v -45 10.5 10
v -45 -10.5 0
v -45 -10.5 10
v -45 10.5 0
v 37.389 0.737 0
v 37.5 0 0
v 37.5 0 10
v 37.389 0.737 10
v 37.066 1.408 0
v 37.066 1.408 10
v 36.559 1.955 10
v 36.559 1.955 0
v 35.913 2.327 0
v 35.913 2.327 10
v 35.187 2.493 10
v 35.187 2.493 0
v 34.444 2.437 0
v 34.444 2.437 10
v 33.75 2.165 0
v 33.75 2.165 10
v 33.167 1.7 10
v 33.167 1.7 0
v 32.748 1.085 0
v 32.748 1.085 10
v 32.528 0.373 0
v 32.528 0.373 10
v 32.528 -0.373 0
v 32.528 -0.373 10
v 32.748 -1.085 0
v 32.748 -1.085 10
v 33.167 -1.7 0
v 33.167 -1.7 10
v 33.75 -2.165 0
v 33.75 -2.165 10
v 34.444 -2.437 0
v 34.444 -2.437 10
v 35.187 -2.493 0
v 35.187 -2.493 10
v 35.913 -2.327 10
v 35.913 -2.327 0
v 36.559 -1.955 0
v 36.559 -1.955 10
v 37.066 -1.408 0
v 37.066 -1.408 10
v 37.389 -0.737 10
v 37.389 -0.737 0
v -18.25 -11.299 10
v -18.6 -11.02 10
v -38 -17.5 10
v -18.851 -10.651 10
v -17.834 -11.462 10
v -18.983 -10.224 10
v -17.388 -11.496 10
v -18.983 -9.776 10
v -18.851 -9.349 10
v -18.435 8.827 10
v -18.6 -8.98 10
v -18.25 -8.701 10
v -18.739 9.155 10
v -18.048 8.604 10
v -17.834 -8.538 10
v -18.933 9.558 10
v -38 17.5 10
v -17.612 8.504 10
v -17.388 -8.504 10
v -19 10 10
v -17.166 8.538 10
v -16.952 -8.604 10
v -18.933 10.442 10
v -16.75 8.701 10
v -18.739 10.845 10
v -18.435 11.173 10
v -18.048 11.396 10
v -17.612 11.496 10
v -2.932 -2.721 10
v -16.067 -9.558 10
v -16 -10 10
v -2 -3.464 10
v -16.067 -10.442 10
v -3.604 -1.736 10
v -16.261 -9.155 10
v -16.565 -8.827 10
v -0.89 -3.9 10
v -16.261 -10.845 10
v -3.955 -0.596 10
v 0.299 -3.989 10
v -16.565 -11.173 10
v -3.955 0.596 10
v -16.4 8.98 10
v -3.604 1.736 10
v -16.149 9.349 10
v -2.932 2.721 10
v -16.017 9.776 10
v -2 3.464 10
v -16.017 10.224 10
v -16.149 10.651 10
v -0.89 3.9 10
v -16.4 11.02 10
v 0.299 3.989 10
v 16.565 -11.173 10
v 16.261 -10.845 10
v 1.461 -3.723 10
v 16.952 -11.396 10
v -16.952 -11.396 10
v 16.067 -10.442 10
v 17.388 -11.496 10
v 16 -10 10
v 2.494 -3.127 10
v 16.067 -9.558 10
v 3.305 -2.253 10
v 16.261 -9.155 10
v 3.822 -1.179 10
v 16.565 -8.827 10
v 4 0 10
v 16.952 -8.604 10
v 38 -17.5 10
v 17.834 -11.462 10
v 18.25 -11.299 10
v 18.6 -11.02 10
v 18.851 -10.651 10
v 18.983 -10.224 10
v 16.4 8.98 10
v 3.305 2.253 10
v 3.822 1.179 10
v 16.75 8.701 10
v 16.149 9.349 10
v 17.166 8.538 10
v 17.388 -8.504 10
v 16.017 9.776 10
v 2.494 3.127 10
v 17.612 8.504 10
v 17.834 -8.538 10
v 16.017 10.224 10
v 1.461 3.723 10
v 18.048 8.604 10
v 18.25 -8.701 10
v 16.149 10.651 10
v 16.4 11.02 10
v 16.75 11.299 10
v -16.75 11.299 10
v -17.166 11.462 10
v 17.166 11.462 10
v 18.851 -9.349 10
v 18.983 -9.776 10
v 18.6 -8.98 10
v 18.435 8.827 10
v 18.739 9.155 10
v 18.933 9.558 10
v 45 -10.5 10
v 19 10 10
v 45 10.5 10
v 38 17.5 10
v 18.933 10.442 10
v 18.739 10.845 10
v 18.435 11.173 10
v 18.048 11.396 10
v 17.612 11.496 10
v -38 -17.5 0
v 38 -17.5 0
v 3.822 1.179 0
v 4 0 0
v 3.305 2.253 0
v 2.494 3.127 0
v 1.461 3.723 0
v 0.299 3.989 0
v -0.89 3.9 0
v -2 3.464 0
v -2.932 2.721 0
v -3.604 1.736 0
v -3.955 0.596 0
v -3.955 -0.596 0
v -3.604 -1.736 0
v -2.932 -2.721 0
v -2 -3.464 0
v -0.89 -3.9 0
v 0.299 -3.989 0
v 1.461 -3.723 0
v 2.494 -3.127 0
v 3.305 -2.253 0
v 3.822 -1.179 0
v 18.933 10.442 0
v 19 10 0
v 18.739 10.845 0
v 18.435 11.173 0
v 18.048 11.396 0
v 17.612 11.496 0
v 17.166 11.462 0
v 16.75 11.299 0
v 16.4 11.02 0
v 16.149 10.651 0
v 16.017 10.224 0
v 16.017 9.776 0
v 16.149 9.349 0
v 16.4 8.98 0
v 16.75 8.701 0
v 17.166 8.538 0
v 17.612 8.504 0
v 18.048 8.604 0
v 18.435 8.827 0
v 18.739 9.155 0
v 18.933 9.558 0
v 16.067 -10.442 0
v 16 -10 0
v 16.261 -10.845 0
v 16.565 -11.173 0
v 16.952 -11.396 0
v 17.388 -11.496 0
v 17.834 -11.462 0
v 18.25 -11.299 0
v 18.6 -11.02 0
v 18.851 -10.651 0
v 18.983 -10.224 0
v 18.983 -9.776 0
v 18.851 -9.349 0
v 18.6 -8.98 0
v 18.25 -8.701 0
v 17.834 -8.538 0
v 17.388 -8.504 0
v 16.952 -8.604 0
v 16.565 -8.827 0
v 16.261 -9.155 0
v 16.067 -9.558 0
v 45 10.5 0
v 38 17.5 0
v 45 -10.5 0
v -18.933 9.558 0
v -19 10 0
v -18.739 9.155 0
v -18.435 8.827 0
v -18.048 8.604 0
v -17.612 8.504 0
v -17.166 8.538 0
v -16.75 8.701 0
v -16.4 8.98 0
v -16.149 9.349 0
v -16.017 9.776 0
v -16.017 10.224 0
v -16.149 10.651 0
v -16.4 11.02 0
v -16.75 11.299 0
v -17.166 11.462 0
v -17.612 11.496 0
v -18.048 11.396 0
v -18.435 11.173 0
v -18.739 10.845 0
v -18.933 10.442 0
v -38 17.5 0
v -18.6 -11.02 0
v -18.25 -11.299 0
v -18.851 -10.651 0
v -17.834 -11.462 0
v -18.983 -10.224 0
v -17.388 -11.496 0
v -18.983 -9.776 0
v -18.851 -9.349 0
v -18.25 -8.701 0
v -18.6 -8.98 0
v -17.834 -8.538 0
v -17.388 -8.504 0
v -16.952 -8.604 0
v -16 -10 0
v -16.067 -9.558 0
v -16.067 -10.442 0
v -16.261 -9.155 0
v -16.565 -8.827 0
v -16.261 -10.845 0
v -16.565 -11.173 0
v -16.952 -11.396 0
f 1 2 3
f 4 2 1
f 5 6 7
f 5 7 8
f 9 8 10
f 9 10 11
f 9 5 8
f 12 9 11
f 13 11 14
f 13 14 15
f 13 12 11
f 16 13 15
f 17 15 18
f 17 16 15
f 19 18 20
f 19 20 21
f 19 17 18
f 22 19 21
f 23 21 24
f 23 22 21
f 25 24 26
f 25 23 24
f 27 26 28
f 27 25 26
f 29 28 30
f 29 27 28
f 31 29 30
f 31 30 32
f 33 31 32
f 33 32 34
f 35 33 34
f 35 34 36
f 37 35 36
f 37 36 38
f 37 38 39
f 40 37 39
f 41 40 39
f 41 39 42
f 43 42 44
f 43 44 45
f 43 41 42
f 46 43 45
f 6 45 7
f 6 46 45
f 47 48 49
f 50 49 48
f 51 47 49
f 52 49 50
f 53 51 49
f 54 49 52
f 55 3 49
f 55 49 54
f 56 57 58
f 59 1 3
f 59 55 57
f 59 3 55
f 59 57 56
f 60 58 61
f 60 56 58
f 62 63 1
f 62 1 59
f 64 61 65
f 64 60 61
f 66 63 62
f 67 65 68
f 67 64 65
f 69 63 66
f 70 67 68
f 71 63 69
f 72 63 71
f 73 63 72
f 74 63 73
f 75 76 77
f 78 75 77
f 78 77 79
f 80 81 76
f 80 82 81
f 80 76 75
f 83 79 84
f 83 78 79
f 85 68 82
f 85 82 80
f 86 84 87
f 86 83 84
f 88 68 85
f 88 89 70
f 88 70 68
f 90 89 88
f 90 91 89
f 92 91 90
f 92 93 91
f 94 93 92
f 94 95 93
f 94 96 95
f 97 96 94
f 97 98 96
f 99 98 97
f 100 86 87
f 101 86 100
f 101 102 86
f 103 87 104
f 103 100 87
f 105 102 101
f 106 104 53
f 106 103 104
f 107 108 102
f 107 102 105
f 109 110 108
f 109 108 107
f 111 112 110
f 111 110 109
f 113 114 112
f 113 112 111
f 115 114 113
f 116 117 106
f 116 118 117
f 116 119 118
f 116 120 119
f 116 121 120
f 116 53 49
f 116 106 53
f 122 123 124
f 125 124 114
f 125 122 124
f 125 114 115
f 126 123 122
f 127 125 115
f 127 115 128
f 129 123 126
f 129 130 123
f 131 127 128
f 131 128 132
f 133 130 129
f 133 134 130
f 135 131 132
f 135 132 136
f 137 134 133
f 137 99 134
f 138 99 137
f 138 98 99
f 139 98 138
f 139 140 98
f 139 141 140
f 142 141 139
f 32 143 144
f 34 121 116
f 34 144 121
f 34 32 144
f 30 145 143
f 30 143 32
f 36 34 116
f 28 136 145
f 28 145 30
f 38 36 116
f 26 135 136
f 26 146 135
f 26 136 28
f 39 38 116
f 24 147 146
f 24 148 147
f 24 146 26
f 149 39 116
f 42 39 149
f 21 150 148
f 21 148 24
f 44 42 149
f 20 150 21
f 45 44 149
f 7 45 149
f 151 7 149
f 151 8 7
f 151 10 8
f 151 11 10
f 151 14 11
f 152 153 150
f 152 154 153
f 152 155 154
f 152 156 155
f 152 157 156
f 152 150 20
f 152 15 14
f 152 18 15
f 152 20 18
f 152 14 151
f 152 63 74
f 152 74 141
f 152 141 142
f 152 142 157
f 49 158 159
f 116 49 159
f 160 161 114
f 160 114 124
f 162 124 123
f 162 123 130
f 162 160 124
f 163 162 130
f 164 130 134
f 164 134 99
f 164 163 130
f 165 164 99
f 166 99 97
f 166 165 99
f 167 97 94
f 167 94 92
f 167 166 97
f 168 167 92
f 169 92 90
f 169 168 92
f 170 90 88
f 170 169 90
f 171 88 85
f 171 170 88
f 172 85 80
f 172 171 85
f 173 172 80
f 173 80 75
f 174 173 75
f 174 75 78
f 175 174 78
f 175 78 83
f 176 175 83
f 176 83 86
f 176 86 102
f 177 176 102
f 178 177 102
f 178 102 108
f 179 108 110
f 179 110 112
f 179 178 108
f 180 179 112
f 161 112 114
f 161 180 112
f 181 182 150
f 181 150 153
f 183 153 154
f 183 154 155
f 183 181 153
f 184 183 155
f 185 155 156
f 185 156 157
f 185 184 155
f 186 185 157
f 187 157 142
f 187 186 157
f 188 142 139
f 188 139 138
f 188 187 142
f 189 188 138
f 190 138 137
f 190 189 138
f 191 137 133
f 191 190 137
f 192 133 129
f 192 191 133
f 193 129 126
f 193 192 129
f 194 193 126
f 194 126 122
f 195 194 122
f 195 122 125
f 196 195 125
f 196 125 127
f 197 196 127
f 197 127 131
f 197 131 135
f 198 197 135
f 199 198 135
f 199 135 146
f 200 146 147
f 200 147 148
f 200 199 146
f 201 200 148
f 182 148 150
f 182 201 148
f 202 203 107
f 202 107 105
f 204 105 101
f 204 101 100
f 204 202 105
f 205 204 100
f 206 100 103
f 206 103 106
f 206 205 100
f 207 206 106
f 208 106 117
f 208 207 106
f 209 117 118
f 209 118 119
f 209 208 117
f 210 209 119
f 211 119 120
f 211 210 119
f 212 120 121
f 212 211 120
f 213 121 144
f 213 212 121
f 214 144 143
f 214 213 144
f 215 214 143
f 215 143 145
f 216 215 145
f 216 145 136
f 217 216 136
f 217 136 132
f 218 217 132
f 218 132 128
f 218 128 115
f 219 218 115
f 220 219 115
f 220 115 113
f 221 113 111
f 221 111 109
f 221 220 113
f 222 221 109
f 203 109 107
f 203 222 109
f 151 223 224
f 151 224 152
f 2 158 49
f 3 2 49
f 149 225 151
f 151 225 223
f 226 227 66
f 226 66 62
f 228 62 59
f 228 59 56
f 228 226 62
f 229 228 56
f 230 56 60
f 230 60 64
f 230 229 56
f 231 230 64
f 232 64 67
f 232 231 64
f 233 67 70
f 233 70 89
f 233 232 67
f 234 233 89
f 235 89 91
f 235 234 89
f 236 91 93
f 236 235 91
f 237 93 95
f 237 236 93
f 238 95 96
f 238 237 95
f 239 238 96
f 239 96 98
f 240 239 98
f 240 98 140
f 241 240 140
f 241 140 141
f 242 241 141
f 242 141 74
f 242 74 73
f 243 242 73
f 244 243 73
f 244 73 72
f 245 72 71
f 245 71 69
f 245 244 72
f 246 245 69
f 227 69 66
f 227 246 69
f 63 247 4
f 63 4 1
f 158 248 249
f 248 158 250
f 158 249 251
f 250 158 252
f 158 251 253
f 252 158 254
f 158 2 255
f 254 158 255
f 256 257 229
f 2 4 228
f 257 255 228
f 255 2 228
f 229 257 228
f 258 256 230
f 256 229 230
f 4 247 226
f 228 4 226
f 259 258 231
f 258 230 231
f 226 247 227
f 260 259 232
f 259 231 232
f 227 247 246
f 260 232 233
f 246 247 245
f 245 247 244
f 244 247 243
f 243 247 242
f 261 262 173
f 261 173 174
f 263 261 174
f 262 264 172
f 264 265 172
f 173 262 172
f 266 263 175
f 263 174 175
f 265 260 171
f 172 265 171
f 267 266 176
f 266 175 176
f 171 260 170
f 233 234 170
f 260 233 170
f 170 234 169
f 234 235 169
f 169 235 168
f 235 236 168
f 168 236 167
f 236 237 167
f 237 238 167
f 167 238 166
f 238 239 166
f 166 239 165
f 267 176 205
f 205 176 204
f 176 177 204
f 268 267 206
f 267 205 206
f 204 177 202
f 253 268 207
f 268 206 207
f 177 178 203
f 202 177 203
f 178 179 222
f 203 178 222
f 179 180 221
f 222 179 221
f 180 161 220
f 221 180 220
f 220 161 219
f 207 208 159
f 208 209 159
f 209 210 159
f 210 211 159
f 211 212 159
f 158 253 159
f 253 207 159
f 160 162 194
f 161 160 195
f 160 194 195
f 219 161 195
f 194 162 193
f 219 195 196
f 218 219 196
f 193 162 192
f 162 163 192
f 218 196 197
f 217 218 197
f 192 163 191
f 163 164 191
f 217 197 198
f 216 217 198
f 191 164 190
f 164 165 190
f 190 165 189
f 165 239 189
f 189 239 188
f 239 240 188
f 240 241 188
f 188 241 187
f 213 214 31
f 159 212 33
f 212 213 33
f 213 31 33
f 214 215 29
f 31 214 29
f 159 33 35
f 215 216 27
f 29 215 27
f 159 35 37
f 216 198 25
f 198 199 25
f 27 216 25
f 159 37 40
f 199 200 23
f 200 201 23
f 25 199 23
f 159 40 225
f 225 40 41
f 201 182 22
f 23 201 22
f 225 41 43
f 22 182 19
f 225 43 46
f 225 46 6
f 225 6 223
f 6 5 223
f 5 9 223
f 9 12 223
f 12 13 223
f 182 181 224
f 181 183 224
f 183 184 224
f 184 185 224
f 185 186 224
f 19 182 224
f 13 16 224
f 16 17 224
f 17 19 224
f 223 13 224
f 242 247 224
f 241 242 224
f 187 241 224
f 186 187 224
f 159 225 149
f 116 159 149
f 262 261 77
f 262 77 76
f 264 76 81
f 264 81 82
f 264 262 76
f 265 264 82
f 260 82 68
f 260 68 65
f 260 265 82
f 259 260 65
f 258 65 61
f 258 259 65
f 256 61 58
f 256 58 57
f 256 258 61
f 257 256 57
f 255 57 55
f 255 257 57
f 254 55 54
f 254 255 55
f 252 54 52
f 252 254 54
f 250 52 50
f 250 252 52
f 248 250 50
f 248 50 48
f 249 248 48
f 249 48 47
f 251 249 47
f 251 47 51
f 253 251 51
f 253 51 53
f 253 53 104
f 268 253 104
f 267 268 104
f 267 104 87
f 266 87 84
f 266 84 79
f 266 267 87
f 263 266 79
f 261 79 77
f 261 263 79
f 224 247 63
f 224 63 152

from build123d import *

# Parameters (mm, degrees)
SKETCH_1_W      = 90
SKETCH_1_H      = 35
SKETCH_1_R      = 2.5
SKETCH_1_R_2    = 4
SKETCH_1_R_3    = 1.5
EXTRUDE_1_DEPTH = 10
CHAMFER_1_SIZE  = 7


with BuildPart() as part:
    # ｽｹｯﾁ1 → ﾎﾞｽ - 押し出し1 (new body)
    with BuildSketch(Plane.XY):
        Rectangle(SKETCH_1_W, SKETCH_1_H)
        with Locations((35, 0)):
            Circle(SKETCH_1_R, mode=Mode.SUBTRACT)
        Circle(SKETCH_1_R_2, mode=Mode.SUBTRACT)
        with Locations((17.5, 10)):
            Circle(SKETCH_1_R_3, mode=Mode.SUBTRACT)
        with Locations(Location((17.5, -10, 0), (0, 0, 180))):
            Circle(SKETCH_1_R_3, mode=Mode.SUBTRACT)
        with Locations(Location((-17.5, 10, 0), (0, 0, 180))):
            Circle(SKETCH_1_R_3, mode=Mode.SUBTRACT)
        with Locations((-17.5, -10)):
            Circle(SKETCH_1_R_3, mode=Mode.SUBTRACT)
    extrude(amount=EXTRUDE_1_DEPTH)

    # 面取り1
    chamfer_1_edges = [part.edges().sort_by_distance(p)[0] for p in [
        (-45, 17.5, 5),
        (45, 17.5, 5),
        (45, -17.5, 5),
        (-45, -17.5, 5),
    ]]
    chamfer(chamfer_1_edges, length=CHAMFER_1_SIZE)


solid = part.part
